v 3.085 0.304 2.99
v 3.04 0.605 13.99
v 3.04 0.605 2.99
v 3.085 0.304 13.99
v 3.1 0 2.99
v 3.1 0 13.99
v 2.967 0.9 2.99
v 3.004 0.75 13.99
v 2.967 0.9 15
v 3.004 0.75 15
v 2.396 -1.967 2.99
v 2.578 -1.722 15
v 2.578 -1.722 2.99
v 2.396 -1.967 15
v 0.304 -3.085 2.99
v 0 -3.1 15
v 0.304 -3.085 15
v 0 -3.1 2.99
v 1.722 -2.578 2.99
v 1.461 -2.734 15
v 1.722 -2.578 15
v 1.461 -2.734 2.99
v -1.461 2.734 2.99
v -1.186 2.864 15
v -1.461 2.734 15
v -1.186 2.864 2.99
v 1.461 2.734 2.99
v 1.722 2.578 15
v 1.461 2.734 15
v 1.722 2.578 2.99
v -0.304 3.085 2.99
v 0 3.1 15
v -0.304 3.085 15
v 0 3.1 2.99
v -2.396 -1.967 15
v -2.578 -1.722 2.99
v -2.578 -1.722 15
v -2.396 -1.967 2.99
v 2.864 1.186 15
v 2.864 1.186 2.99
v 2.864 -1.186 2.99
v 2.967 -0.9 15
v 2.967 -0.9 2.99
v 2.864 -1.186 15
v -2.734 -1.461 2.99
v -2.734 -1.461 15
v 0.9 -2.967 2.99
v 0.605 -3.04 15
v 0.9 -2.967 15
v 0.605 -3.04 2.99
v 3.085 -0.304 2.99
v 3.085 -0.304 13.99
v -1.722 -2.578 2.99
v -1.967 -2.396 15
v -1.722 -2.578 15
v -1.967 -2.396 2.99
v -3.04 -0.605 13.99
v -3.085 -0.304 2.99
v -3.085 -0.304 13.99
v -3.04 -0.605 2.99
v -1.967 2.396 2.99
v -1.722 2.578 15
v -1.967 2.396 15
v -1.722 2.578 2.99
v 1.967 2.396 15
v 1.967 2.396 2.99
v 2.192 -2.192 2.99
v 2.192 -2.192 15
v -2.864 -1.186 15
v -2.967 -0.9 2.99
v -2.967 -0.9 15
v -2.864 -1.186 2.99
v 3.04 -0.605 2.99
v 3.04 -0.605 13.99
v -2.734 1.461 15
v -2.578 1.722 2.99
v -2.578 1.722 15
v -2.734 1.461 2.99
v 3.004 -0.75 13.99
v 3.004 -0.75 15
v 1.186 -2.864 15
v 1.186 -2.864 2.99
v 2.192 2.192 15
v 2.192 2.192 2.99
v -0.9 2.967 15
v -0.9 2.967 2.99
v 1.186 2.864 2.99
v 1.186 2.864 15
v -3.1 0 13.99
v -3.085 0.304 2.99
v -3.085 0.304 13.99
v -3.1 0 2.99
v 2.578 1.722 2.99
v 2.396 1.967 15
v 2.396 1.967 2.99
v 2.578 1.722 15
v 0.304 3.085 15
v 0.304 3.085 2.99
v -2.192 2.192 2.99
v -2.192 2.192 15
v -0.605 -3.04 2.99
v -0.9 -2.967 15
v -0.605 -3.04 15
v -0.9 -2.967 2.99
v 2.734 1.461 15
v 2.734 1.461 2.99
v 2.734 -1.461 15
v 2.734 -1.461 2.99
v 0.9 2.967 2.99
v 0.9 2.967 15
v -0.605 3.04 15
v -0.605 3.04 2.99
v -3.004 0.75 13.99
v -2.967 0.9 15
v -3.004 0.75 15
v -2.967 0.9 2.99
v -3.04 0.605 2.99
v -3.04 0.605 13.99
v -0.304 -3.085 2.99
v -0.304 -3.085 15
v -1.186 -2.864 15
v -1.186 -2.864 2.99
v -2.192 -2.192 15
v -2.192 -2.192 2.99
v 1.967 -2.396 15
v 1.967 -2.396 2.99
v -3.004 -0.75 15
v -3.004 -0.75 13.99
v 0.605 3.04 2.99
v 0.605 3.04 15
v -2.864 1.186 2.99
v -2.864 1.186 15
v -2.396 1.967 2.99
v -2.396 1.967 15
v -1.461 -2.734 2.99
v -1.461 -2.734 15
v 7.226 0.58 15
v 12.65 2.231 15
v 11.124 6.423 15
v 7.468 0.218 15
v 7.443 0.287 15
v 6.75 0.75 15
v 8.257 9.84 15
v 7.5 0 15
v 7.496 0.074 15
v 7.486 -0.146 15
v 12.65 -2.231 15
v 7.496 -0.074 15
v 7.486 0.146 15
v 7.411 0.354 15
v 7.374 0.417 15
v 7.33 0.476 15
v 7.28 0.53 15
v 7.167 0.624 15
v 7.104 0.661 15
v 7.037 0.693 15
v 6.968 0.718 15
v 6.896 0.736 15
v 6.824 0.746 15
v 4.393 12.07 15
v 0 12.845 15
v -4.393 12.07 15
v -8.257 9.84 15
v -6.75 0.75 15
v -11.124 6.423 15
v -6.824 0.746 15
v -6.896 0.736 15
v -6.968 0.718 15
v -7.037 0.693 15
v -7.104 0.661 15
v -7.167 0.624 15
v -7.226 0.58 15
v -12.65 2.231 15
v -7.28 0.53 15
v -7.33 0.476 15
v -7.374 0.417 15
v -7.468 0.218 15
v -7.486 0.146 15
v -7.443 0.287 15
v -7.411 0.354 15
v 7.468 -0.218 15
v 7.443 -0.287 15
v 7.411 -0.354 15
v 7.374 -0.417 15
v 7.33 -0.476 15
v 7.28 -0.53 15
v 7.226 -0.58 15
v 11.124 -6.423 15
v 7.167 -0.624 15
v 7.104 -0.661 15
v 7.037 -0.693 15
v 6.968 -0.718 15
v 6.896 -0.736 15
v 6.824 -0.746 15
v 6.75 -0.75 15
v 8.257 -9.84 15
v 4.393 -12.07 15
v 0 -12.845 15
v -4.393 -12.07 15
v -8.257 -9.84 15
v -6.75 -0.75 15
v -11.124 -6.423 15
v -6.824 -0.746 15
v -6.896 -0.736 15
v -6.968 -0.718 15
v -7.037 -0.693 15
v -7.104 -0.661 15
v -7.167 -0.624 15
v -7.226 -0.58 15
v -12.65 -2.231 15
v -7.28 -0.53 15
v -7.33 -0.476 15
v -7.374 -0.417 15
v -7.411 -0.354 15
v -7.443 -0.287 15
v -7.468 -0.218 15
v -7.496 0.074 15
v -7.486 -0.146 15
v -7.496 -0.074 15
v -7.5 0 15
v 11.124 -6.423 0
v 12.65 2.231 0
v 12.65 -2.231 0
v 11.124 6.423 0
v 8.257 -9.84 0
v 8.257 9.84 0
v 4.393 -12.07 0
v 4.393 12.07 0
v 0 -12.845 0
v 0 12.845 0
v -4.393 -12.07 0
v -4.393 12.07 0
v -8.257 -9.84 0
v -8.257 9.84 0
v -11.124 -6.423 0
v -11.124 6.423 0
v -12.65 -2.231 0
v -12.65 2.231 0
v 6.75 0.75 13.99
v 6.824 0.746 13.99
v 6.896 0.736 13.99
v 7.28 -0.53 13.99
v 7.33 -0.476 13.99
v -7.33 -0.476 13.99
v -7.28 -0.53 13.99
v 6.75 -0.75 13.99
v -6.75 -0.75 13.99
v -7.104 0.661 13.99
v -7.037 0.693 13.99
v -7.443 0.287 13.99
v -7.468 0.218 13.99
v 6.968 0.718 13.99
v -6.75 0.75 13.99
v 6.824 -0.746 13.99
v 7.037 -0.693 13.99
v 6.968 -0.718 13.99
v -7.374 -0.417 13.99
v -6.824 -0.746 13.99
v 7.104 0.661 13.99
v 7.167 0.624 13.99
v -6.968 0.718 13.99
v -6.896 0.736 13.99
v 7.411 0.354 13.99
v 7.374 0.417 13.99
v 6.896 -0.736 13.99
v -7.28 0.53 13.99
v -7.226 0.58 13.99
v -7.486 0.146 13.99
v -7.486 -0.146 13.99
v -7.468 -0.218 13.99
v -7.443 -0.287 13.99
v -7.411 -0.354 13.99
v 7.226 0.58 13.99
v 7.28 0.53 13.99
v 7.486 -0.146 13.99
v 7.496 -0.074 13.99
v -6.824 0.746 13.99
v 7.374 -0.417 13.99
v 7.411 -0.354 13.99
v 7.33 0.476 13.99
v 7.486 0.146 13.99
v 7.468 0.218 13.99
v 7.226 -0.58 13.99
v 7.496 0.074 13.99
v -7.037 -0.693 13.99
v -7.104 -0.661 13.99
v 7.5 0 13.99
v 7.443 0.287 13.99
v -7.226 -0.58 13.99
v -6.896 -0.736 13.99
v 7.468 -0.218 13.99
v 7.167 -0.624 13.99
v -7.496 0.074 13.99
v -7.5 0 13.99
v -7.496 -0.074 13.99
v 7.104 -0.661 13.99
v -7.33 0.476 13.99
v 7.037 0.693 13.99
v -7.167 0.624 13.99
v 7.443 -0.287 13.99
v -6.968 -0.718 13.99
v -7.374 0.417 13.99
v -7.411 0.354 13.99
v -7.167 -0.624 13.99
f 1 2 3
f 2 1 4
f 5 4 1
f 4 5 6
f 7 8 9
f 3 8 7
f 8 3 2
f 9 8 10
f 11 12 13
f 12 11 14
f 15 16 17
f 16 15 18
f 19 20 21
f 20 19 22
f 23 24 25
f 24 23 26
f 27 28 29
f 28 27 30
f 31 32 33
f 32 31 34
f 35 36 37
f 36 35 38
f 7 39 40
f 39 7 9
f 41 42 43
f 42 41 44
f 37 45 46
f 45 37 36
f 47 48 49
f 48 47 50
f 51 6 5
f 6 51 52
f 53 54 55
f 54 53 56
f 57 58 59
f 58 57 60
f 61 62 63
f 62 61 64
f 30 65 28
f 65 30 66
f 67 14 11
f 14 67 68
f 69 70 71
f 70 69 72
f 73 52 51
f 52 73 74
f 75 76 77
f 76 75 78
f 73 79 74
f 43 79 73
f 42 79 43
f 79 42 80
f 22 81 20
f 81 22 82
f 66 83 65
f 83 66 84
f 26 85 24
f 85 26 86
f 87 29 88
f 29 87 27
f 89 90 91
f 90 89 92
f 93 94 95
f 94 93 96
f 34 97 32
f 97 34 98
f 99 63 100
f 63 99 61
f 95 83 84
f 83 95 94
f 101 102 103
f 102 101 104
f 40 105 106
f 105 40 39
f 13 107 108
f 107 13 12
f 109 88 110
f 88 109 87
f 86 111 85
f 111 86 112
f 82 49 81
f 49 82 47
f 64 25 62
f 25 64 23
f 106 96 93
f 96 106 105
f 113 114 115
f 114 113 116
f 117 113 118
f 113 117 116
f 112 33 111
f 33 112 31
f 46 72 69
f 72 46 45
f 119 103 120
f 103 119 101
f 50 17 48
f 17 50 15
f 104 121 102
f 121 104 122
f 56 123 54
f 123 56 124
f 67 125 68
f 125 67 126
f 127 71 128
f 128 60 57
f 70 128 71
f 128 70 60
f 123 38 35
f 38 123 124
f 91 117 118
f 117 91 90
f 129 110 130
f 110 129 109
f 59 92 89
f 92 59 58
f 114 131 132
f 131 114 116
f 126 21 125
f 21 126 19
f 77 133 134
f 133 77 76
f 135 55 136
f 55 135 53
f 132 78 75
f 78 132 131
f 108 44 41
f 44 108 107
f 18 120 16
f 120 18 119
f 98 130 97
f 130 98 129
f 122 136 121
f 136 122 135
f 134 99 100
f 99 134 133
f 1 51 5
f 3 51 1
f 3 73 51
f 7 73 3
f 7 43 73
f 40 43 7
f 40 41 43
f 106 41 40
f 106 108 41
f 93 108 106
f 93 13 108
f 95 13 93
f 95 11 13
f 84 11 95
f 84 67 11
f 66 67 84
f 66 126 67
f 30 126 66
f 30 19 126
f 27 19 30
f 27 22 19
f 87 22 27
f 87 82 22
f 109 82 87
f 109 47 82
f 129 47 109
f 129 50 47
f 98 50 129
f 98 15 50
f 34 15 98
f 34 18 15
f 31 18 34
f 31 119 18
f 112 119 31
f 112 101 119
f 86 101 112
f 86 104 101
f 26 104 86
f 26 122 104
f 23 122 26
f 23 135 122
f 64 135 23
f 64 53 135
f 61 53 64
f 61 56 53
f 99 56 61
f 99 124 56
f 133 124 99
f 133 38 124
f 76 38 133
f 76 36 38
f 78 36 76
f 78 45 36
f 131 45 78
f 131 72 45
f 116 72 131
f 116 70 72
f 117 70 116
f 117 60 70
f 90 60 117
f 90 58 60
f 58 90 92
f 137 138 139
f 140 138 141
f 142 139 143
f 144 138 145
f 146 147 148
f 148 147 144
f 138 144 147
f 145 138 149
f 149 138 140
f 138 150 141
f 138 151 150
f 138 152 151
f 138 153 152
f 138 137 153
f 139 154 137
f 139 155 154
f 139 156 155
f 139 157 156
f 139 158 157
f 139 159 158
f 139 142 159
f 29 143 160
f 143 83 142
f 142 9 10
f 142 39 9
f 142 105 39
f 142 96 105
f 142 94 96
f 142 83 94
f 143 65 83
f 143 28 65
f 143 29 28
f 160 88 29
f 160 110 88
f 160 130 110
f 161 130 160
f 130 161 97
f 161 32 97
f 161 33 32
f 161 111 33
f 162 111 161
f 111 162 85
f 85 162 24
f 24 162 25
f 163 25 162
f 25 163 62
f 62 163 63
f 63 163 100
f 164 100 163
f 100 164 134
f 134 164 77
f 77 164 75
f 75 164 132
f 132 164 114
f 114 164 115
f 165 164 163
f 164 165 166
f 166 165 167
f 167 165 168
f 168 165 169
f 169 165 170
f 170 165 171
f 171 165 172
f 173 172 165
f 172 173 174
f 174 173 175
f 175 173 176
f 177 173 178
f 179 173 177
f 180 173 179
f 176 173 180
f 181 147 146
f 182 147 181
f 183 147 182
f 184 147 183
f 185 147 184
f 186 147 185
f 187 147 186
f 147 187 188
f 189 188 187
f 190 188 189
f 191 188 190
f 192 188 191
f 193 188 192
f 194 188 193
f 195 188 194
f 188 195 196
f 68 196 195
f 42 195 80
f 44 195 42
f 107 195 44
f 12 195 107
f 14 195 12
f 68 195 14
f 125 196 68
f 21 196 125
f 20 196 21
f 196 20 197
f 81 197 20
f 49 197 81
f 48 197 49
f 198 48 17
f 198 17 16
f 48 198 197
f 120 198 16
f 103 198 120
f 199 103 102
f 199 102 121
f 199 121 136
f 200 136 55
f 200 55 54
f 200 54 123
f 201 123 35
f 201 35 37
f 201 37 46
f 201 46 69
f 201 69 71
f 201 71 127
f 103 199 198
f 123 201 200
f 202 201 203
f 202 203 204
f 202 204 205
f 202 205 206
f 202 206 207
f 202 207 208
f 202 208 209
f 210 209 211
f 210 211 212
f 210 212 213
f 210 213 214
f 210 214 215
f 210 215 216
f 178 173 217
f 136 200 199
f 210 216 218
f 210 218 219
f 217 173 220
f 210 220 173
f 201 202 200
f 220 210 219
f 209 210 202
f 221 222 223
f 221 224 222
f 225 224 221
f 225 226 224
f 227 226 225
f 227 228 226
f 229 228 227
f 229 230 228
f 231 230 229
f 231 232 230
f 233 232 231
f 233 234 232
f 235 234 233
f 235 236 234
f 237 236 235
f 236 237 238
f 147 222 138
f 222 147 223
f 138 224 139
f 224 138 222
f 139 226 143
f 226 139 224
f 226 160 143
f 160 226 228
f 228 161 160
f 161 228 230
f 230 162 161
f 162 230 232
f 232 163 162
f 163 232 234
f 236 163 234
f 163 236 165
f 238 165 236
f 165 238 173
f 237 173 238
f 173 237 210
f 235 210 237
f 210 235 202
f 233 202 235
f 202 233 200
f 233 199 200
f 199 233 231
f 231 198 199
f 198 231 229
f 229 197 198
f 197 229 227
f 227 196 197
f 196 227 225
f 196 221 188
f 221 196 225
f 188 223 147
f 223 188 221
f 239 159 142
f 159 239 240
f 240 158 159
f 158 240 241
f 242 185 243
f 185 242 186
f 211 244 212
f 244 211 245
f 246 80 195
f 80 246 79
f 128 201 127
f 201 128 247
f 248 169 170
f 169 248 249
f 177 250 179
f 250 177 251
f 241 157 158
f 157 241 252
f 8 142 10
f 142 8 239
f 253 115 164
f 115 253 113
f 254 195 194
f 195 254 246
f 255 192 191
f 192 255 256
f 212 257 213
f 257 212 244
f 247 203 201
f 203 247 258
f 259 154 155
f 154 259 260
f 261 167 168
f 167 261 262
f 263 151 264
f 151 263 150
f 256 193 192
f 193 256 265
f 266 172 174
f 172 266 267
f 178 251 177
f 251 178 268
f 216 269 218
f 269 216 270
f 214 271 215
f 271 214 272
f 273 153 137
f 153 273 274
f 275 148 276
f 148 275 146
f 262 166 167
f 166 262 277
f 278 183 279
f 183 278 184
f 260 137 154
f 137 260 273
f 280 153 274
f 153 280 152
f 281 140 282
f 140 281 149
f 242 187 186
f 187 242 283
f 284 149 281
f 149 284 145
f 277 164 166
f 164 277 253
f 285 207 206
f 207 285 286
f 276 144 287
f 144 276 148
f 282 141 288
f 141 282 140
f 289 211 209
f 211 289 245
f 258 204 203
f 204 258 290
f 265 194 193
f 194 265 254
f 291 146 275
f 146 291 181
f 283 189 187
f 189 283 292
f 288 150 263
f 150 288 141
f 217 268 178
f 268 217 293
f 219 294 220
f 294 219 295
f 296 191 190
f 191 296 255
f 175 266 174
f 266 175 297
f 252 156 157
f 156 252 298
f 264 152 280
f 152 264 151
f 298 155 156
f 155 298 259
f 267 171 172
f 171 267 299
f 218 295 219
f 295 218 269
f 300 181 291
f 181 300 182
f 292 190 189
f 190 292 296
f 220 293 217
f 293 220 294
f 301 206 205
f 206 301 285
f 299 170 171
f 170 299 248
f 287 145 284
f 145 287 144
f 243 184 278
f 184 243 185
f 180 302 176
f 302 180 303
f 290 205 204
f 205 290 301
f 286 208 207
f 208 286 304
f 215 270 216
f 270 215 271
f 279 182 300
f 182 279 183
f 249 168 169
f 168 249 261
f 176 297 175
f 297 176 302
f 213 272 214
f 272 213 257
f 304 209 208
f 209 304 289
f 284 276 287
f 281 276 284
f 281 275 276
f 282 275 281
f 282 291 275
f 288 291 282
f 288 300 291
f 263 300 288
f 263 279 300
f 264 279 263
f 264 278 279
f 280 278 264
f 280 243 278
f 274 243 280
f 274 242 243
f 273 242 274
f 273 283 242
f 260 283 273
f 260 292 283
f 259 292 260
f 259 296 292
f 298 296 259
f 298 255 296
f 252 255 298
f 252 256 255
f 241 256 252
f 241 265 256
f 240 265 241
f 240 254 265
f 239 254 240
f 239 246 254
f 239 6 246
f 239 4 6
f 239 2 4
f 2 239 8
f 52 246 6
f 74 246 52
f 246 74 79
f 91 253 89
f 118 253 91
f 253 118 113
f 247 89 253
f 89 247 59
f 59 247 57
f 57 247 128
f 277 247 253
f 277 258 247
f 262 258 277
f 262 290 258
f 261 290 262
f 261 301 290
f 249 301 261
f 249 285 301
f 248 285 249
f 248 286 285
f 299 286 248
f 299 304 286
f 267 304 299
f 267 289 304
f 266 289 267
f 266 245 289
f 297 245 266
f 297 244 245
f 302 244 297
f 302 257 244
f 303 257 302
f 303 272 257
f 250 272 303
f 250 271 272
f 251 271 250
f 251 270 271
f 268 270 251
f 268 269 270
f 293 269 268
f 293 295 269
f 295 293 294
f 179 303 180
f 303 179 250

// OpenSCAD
// Built by bench/smallmodels/features/compiler.py from a list of features.
$fn = 64;
difference() {
  union() {
    translate([0, 0, 0]) cylinder(d = 30, h = 15);
  }
  union() {
    translate([0, 0, 2.99]) rotate([0, 0, 0]) cylinder(d = 6.2, h = 12.02);
    translate([15, 0, 0]) rotate([0, 0, 0]) translate([-2.35, -15, 0]) cube([4.7, 30, 15]);
    translate([14.0954, 5.1303, 0]) rotate([0, 0, 20]) translate([-2.35, -15, 0]) cube([4.7, 30, 15]);
    translate([11.4907, 9.6418, 0]) rotate([0, 0, 40]) translate([-2.35, -15, 0]) cube([4.7, 30, 15]);
    translate([7.5, 12.9904, 0]) rotate([0, 0, 60]) translate([-2.35, -15, 0]) cube([4.7, 30, 15]);
    translate([2.6047, 14.7721, 0]) rotate([0, 0, 80]) translate([-2.35, -15, 0]) cube([4.7, 30, 15]);
    translate([-2.6047, 14.7721, 0]) rotate([0, 0, 100]) translate([-2.35, -15, 0]) cube([4.7, 30, 15]);
    translate([-7.5, 12.9904, 0]) rotate([0, 0, 120]) translate([-2.35, -15, 0]) cube([4.7, 30, 15]);
    translate([-11.4907, 9.6418, 0]) rotate([0, 0, 140]) translate([-2.35, -15, 0]) cube([4.7, 30, 15]);
    translate([-14.0954, 5.1303, 0]) rotate([0, 0, 160]) translate([-2.35, -15, 0]) cube([4.7, 30, 15]);
    translate([-15, 0, 0]) rotate([0, 0, 180]) translate([-2.35, -15, 0]) cube([4.7, 30, 15]);
    translate([-14.0954, -5.1303, 0]) rotate([0, 0, 200]) translate([-2.35, -15, 0]) cube([4.7, 30, 15]);
    translate([-11.4907, -9.6418, 0]) rotate([0, 0, 220]) translate([-2.35, -15, 0]) cube([4.7, 30, 15]);
    translate([-7.5, -12.9904, 0]) rotate([0, 0, 240]) translate([-2.35, -15, 0]) cube([4.7, 30, 15]);
    translate([-2.6047, -14.7721, 0]) rotate([0, 0, 260]) translate([-2.35, -15, 0]) cube([4.7, 30, 15]);
    translate([2.6047, -14.7721, 0]) rotate([0, 0, 280]) translate([-2.35, -15, 0]) cube([4.7, 30, 15]);
    translate([7.5, -12.9904, 0]) rotate([0, 0, 300]) translate([-2.35, -15, 0]) cube([4.7, 30, 15]);
    translate([11.4907, -9.6418, 0]) rotate([0, 0, 320]) translate([-2.35, -15, 0]) cube([4.7, 30, 15]);
    translate([14.0954, -5.1303, 0]) rotate([0, 0, 340]) translate([-2.35, -15, 0]) cube([4.7, 30, 15]);
    translate([0, 0, 13.99]) rotate([0, 0, 0]) hull() { for (s = [-1, 1]) translate([s * 6.75, 0, 0]) cylinder(d = 1.5, h = 1.02); }
  }
}
